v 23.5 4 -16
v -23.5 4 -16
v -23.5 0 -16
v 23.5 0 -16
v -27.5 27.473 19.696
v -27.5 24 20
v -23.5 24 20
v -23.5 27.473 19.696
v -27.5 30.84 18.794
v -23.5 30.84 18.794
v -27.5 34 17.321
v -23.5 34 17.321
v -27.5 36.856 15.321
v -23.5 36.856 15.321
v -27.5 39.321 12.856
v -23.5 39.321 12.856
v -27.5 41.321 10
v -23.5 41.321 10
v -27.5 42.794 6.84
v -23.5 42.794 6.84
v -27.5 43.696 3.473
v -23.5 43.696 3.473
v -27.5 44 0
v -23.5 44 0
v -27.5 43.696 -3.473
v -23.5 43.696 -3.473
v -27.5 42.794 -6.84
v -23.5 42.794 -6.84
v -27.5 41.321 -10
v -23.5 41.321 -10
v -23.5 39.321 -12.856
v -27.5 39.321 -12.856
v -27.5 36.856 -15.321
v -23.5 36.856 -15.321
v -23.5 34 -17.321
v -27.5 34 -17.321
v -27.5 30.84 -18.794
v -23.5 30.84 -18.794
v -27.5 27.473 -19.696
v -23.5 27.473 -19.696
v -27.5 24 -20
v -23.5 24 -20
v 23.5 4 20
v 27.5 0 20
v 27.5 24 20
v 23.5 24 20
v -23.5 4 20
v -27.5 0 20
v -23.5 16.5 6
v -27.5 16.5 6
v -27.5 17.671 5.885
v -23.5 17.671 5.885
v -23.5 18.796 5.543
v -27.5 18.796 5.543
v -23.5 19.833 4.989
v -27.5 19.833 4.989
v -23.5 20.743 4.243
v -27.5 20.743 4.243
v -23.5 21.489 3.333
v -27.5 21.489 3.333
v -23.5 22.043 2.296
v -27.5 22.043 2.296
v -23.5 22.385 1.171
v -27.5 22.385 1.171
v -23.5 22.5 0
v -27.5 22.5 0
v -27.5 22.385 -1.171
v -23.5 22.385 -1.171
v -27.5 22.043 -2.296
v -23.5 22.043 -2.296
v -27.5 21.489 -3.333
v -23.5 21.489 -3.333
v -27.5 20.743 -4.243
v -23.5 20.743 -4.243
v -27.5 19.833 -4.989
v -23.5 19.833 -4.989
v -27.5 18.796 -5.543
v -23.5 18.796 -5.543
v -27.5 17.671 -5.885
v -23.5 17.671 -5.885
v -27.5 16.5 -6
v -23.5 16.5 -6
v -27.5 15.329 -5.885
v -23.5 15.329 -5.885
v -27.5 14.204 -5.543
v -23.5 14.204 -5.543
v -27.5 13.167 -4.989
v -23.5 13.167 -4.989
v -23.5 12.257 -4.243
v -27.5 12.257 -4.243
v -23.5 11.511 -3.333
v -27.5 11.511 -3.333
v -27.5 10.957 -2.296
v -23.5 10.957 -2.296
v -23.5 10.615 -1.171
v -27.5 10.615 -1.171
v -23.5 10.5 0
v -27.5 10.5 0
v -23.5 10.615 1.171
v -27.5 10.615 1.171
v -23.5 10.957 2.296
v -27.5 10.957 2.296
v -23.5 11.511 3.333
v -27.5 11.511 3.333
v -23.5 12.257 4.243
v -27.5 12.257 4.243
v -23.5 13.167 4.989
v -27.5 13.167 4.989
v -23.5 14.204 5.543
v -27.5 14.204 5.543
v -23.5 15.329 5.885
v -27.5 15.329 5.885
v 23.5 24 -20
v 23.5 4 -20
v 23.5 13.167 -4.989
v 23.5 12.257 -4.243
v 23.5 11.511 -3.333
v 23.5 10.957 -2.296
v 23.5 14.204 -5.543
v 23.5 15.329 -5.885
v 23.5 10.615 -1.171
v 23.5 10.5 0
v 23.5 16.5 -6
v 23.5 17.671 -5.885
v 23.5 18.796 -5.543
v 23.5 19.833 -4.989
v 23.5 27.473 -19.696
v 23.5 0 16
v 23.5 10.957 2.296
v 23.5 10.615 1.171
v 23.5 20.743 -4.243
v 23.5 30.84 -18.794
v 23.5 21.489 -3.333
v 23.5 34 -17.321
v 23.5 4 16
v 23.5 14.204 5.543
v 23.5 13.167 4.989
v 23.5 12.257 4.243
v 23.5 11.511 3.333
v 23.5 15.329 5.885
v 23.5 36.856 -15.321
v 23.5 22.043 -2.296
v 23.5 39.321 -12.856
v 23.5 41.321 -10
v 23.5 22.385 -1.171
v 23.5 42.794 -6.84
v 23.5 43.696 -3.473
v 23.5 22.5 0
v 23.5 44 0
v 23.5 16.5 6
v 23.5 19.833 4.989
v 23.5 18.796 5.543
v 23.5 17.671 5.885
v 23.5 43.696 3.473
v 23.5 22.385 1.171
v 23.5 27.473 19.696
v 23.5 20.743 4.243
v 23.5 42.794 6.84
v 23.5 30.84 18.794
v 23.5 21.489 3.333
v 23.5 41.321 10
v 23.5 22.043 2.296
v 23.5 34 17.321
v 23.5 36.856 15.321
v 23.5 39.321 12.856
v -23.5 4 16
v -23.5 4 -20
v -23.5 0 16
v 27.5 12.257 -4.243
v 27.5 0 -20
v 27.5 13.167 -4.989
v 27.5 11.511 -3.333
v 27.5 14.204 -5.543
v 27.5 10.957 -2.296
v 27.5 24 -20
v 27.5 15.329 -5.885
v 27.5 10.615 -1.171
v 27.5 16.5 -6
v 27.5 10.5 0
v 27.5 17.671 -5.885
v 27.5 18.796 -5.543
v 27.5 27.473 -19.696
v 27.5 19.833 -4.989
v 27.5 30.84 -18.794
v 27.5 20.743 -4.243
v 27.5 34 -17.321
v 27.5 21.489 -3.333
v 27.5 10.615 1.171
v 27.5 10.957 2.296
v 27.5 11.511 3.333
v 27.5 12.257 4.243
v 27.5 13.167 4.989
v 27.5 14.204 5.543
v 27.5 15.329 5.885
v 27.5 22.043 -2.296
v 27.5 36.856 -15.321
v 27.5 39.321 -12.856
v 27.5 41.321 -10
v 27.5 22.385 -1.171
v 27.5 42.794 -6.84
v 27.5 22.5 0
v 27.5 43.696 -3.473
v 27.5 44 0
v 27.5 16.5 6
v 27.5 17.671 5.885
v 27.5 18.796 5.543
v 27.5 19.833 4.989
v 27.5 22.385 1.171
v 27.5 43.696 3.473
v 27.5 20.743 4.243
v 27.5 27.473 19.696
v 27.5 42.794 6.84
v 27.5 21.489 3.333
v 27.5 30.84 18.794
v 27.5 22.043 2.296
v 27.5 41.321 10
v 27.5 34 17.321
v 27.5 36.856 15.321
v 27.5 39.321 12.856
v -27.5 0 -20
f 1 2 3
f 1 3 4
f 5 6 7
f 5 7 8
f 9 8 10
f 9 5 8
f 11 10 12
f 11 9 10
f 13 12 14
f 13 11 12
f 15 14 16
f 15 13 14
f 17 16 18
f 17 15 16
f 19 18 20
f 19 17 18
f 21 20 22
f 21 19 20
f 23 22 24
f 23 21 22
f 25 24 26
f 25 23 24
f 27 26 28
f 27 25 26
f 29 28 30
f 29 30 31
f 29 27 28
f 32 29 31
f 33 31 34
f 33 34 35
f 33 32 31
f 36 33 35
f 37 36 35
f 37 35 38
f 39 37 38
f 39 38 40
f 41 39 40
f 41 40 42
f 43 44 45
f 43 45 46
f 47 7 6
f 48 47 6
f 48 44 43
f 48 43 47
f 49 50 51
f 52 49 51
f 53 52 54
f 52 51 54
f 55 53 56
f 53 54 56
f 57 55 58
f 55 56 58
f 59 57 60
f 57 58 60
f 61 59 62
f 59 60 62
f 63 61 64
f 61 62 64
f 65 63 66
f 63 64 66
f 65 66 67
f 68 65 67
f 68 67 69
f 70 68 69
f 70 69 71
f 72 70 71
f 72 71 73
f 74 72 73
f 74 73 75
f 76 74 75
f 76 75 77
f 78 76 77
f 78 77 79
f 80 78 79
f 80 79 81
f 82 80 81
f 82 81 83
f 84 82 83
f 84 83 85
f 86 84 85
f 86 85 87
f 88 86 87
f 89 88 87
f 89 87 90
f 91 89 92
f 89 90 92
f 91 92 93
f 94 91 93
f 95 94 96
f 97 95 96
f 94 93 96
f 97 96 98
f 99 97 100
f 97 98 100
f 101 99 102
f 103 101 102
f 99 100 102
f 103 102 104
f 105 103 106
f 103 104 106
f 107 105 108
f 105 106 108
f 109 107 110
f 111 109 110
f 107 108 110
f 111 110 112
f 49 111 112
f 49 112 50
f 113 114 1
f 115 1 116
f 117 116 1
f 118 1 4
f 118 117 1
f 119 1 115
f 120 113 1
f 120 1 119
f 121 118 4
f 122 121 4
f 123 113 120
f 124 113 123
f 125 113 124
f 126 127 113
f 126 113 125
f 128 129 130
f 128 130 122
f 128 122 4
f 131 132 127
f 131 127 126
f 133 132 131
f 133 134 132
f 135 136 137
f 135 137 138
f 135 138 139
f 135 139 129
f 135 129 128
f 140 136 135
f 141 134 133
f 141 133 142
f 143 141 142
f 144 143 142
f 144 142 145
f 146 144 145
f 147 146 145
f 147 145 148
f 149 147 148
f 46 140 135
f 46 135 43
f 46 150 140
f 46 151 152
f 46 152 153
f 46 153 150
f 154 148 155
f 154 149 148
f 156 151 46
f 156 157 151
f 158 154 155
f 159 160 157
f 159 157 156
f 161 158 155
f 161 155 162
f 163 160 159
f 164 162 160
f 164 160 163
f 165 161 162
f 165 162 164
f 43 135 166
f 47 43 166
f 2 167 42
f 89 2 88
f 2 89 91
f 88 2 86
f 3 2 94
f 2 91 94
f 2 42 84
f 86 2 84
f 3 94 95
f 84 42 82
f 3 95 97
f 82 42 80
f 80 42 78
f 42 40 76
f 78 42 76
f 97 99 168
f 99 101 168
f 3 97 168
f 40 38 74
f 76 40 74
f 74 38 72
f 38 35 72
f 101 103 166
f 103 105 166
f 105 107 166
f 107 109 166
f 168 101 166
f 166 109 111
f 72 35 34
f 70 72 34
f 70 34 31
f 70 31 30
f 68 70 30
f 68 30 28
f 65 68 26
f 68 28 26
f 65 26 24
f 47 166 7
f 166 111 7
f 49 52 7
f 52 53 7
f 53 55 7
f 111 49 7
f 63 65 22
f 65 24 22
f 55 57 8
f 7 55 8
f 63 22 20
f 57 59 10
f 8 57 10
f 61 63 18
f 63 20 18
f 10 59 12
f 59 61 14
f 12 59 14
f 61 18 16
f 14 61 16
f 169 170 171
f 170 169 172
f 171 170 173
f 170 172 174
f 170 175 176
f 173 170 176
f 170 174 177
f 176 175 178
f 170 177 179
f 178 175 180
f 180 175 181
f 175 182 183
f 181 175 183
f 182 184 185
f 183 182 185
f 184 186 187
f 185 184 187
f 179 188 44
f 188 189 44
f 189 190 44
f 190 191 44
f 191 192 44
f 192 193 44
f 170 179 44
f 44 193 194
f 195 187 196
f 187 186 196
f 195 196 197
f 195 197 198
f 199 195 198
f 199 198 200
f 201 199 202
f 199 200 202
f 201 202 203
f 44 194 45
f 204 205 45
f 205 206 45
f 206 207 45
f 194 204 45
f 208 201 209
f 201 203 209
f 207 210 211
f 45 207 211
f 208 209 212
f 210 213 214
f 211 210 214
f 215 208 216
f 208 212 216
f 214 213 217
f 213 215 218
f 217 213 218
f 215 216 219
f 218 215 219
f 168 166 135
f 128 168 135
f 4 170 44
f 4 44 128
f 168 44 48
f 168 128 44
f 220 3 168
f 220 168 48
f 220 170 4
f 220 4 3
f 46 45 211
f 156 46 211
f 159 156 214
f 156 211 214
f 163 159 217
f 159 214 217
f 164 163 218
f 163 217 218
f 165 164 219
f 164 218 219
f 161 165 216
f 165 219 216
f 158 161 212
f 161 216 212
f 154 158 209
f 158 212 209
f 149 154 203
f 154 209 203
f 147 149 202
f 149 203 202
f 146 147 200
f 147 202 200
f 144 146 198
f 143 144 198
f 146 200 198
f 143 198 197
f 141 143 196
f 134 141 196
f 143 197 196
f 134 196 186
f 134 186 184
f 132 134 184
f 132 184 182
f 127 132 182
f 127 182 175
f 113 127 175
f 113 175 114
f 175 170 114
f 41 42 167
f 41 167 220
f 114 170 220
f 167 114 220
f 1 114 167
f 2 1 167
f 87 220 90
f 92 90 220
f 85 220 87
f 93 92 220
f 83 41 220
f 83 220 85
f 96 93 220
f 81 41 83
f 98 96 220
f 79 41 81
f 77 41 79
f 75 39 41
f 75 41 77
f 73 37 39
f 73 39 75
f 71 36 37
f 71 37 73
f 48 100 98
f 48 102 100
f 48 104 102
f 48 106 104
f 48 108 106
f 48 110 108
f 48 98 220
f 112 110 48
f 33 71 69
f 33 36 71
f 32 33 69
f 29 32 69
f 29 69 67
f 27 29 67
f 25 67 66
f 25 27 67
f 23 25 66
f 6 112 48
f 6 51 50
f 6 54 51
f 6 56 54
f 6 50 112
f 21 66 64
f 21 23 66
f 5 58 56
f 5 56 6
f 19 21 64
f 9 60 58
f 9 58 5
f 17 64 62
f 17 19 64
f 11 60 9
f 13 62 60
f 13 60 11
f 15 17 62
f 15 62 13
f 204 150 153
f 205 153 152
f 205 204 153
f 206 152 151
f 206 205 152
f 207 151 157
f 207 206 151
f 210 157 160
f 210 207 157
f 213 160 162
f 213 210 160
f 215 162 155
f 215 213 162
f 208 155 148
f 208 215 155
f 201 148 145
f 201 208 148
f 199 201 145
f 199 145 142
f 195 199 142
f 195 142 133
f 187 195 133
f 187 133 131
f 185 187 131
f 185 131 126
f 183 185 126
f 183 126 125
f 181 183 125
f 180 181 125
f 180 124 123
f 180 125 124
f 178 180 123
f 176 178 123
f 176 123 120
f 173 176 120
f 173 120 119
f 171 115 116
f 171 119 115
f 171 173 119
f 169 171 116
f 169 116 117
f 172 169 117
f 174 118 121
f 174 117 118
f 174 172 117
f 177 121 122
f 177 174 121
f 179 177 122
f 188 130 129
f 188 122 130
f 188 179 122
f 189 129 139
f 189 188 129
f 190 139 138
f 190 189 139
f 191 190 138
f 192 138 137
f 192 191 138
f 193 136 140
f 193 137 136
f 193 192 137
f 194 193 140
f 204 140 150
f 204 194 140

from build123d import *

# Parameters (mm, degrees)
SKETCH1_W           = 27.5
SKETCH1_H           = 40
BOSS_EXTRUDE4_DEPTH = 4
SKETCH5_W           = 4
SKETCH5_H           = 40
BOSS_EXTRUDE5_DEPTH = 20
SKETCH6_R           = 6
CUT_EXTRUDE2_DEPTH  = 42.620307543
BOSS_EXTRUDE6_DEPTH = 4
SKETCH8_W           = 47
SKETCH8_H           = 32
CUT_EXTRUDE3_DEPTH  = 53.5


with BuildPart() as part:
    # Sketch1 → Boss-Extrude4 (new body)
    with BuildSketch(Plane(origin=(0, 0, 0), x_dir=(1, 0, 0), z_dir=(0, 1, 0))):
        with Locations((-13.75, 0)):
            Rectangle(SKETCH1_W, SKETCH1_H)
    boss_extrude4 = extrude(amount=BOSS_EXTRUDE4_DEPTH)

    # Sketch5 → Boss-Extrude5 (add)
    with BuildSketch(Plane(origin=(0, 4, 0), x_dir=(1, 0, 0), z_dir=(0, 1, 0))):
        with Locations((-25.5, 0)):
            Rectangle(SKETCH5_W, SKETCH5_H)
    boss_extrude5 = extrude(amount=BOSS_EXTRUDE5_DEPTH)

    # Sketch6 → Cut-Extrude2 (cut, through all)
    with BuildSketch(Plane.ZY.offset(27.5)):
        with Locations((0, 16.5)):
            Circle(SKETCH6_R)
    cut_extrude2 = extrude(amount=-CUT_EXTRUDE2_DEPTH, mode=Mode.SUBTRACT)

    # Sketch7 → Boss-Extrude6 (add)
    with BuildSketch(Plane.ZY.offset(27.5)):
        with BuildLine():
            Line((-20, 24), (20, 24))
            ThreePointArc((20, 24), (0, 44), (-20, 24))
        make_face()
    boss_extrude6 = extrude(amount=-BOSS_EXTRUDE6_DEPTH)

    # Mirror2: Boss-Extrude4, Boss-Extrude5, Cut-Extrude2, Boss-Extrude6 across plane
    add(boss_extrude4.mirror(Plane(origin=(0, 0, 0), x_dir=(0, 0, 1), z_dir=(1, 0, 0))))
    add(boss_extrude5.mirror(Plane(origin=(0, 0, 0), x_dir=(0, 0, 1), z_dir=(1, 0, 0))))
    add(cut_extrude2.mirror(Plane(origin=(0, 0, 0), x_dir=(0, 0, 1), z_dir=(1, 0, 0))), mode=Mode.SUBTRACT)
    add(boss_extrude6.mirror(Plane(origin=(0, 0, 0), x_dir=(0, 0, 1), z_dir=(1, 0, 0))))

    # Sketch8 → Cut-Extrude3 (cut, through all)
    with BuildSketch(Plane(origin=(0, 4, 0), x_dir=(1, 0, 0), z_dir=(0, 1, 0))):
        Rectangle(SKETCH8_W, SKETCH8_H)
    extrude(amount=-CUT_EXTRUDE3_DEPTH, mode=Mode.SUBTRACT)


solid = part.part
